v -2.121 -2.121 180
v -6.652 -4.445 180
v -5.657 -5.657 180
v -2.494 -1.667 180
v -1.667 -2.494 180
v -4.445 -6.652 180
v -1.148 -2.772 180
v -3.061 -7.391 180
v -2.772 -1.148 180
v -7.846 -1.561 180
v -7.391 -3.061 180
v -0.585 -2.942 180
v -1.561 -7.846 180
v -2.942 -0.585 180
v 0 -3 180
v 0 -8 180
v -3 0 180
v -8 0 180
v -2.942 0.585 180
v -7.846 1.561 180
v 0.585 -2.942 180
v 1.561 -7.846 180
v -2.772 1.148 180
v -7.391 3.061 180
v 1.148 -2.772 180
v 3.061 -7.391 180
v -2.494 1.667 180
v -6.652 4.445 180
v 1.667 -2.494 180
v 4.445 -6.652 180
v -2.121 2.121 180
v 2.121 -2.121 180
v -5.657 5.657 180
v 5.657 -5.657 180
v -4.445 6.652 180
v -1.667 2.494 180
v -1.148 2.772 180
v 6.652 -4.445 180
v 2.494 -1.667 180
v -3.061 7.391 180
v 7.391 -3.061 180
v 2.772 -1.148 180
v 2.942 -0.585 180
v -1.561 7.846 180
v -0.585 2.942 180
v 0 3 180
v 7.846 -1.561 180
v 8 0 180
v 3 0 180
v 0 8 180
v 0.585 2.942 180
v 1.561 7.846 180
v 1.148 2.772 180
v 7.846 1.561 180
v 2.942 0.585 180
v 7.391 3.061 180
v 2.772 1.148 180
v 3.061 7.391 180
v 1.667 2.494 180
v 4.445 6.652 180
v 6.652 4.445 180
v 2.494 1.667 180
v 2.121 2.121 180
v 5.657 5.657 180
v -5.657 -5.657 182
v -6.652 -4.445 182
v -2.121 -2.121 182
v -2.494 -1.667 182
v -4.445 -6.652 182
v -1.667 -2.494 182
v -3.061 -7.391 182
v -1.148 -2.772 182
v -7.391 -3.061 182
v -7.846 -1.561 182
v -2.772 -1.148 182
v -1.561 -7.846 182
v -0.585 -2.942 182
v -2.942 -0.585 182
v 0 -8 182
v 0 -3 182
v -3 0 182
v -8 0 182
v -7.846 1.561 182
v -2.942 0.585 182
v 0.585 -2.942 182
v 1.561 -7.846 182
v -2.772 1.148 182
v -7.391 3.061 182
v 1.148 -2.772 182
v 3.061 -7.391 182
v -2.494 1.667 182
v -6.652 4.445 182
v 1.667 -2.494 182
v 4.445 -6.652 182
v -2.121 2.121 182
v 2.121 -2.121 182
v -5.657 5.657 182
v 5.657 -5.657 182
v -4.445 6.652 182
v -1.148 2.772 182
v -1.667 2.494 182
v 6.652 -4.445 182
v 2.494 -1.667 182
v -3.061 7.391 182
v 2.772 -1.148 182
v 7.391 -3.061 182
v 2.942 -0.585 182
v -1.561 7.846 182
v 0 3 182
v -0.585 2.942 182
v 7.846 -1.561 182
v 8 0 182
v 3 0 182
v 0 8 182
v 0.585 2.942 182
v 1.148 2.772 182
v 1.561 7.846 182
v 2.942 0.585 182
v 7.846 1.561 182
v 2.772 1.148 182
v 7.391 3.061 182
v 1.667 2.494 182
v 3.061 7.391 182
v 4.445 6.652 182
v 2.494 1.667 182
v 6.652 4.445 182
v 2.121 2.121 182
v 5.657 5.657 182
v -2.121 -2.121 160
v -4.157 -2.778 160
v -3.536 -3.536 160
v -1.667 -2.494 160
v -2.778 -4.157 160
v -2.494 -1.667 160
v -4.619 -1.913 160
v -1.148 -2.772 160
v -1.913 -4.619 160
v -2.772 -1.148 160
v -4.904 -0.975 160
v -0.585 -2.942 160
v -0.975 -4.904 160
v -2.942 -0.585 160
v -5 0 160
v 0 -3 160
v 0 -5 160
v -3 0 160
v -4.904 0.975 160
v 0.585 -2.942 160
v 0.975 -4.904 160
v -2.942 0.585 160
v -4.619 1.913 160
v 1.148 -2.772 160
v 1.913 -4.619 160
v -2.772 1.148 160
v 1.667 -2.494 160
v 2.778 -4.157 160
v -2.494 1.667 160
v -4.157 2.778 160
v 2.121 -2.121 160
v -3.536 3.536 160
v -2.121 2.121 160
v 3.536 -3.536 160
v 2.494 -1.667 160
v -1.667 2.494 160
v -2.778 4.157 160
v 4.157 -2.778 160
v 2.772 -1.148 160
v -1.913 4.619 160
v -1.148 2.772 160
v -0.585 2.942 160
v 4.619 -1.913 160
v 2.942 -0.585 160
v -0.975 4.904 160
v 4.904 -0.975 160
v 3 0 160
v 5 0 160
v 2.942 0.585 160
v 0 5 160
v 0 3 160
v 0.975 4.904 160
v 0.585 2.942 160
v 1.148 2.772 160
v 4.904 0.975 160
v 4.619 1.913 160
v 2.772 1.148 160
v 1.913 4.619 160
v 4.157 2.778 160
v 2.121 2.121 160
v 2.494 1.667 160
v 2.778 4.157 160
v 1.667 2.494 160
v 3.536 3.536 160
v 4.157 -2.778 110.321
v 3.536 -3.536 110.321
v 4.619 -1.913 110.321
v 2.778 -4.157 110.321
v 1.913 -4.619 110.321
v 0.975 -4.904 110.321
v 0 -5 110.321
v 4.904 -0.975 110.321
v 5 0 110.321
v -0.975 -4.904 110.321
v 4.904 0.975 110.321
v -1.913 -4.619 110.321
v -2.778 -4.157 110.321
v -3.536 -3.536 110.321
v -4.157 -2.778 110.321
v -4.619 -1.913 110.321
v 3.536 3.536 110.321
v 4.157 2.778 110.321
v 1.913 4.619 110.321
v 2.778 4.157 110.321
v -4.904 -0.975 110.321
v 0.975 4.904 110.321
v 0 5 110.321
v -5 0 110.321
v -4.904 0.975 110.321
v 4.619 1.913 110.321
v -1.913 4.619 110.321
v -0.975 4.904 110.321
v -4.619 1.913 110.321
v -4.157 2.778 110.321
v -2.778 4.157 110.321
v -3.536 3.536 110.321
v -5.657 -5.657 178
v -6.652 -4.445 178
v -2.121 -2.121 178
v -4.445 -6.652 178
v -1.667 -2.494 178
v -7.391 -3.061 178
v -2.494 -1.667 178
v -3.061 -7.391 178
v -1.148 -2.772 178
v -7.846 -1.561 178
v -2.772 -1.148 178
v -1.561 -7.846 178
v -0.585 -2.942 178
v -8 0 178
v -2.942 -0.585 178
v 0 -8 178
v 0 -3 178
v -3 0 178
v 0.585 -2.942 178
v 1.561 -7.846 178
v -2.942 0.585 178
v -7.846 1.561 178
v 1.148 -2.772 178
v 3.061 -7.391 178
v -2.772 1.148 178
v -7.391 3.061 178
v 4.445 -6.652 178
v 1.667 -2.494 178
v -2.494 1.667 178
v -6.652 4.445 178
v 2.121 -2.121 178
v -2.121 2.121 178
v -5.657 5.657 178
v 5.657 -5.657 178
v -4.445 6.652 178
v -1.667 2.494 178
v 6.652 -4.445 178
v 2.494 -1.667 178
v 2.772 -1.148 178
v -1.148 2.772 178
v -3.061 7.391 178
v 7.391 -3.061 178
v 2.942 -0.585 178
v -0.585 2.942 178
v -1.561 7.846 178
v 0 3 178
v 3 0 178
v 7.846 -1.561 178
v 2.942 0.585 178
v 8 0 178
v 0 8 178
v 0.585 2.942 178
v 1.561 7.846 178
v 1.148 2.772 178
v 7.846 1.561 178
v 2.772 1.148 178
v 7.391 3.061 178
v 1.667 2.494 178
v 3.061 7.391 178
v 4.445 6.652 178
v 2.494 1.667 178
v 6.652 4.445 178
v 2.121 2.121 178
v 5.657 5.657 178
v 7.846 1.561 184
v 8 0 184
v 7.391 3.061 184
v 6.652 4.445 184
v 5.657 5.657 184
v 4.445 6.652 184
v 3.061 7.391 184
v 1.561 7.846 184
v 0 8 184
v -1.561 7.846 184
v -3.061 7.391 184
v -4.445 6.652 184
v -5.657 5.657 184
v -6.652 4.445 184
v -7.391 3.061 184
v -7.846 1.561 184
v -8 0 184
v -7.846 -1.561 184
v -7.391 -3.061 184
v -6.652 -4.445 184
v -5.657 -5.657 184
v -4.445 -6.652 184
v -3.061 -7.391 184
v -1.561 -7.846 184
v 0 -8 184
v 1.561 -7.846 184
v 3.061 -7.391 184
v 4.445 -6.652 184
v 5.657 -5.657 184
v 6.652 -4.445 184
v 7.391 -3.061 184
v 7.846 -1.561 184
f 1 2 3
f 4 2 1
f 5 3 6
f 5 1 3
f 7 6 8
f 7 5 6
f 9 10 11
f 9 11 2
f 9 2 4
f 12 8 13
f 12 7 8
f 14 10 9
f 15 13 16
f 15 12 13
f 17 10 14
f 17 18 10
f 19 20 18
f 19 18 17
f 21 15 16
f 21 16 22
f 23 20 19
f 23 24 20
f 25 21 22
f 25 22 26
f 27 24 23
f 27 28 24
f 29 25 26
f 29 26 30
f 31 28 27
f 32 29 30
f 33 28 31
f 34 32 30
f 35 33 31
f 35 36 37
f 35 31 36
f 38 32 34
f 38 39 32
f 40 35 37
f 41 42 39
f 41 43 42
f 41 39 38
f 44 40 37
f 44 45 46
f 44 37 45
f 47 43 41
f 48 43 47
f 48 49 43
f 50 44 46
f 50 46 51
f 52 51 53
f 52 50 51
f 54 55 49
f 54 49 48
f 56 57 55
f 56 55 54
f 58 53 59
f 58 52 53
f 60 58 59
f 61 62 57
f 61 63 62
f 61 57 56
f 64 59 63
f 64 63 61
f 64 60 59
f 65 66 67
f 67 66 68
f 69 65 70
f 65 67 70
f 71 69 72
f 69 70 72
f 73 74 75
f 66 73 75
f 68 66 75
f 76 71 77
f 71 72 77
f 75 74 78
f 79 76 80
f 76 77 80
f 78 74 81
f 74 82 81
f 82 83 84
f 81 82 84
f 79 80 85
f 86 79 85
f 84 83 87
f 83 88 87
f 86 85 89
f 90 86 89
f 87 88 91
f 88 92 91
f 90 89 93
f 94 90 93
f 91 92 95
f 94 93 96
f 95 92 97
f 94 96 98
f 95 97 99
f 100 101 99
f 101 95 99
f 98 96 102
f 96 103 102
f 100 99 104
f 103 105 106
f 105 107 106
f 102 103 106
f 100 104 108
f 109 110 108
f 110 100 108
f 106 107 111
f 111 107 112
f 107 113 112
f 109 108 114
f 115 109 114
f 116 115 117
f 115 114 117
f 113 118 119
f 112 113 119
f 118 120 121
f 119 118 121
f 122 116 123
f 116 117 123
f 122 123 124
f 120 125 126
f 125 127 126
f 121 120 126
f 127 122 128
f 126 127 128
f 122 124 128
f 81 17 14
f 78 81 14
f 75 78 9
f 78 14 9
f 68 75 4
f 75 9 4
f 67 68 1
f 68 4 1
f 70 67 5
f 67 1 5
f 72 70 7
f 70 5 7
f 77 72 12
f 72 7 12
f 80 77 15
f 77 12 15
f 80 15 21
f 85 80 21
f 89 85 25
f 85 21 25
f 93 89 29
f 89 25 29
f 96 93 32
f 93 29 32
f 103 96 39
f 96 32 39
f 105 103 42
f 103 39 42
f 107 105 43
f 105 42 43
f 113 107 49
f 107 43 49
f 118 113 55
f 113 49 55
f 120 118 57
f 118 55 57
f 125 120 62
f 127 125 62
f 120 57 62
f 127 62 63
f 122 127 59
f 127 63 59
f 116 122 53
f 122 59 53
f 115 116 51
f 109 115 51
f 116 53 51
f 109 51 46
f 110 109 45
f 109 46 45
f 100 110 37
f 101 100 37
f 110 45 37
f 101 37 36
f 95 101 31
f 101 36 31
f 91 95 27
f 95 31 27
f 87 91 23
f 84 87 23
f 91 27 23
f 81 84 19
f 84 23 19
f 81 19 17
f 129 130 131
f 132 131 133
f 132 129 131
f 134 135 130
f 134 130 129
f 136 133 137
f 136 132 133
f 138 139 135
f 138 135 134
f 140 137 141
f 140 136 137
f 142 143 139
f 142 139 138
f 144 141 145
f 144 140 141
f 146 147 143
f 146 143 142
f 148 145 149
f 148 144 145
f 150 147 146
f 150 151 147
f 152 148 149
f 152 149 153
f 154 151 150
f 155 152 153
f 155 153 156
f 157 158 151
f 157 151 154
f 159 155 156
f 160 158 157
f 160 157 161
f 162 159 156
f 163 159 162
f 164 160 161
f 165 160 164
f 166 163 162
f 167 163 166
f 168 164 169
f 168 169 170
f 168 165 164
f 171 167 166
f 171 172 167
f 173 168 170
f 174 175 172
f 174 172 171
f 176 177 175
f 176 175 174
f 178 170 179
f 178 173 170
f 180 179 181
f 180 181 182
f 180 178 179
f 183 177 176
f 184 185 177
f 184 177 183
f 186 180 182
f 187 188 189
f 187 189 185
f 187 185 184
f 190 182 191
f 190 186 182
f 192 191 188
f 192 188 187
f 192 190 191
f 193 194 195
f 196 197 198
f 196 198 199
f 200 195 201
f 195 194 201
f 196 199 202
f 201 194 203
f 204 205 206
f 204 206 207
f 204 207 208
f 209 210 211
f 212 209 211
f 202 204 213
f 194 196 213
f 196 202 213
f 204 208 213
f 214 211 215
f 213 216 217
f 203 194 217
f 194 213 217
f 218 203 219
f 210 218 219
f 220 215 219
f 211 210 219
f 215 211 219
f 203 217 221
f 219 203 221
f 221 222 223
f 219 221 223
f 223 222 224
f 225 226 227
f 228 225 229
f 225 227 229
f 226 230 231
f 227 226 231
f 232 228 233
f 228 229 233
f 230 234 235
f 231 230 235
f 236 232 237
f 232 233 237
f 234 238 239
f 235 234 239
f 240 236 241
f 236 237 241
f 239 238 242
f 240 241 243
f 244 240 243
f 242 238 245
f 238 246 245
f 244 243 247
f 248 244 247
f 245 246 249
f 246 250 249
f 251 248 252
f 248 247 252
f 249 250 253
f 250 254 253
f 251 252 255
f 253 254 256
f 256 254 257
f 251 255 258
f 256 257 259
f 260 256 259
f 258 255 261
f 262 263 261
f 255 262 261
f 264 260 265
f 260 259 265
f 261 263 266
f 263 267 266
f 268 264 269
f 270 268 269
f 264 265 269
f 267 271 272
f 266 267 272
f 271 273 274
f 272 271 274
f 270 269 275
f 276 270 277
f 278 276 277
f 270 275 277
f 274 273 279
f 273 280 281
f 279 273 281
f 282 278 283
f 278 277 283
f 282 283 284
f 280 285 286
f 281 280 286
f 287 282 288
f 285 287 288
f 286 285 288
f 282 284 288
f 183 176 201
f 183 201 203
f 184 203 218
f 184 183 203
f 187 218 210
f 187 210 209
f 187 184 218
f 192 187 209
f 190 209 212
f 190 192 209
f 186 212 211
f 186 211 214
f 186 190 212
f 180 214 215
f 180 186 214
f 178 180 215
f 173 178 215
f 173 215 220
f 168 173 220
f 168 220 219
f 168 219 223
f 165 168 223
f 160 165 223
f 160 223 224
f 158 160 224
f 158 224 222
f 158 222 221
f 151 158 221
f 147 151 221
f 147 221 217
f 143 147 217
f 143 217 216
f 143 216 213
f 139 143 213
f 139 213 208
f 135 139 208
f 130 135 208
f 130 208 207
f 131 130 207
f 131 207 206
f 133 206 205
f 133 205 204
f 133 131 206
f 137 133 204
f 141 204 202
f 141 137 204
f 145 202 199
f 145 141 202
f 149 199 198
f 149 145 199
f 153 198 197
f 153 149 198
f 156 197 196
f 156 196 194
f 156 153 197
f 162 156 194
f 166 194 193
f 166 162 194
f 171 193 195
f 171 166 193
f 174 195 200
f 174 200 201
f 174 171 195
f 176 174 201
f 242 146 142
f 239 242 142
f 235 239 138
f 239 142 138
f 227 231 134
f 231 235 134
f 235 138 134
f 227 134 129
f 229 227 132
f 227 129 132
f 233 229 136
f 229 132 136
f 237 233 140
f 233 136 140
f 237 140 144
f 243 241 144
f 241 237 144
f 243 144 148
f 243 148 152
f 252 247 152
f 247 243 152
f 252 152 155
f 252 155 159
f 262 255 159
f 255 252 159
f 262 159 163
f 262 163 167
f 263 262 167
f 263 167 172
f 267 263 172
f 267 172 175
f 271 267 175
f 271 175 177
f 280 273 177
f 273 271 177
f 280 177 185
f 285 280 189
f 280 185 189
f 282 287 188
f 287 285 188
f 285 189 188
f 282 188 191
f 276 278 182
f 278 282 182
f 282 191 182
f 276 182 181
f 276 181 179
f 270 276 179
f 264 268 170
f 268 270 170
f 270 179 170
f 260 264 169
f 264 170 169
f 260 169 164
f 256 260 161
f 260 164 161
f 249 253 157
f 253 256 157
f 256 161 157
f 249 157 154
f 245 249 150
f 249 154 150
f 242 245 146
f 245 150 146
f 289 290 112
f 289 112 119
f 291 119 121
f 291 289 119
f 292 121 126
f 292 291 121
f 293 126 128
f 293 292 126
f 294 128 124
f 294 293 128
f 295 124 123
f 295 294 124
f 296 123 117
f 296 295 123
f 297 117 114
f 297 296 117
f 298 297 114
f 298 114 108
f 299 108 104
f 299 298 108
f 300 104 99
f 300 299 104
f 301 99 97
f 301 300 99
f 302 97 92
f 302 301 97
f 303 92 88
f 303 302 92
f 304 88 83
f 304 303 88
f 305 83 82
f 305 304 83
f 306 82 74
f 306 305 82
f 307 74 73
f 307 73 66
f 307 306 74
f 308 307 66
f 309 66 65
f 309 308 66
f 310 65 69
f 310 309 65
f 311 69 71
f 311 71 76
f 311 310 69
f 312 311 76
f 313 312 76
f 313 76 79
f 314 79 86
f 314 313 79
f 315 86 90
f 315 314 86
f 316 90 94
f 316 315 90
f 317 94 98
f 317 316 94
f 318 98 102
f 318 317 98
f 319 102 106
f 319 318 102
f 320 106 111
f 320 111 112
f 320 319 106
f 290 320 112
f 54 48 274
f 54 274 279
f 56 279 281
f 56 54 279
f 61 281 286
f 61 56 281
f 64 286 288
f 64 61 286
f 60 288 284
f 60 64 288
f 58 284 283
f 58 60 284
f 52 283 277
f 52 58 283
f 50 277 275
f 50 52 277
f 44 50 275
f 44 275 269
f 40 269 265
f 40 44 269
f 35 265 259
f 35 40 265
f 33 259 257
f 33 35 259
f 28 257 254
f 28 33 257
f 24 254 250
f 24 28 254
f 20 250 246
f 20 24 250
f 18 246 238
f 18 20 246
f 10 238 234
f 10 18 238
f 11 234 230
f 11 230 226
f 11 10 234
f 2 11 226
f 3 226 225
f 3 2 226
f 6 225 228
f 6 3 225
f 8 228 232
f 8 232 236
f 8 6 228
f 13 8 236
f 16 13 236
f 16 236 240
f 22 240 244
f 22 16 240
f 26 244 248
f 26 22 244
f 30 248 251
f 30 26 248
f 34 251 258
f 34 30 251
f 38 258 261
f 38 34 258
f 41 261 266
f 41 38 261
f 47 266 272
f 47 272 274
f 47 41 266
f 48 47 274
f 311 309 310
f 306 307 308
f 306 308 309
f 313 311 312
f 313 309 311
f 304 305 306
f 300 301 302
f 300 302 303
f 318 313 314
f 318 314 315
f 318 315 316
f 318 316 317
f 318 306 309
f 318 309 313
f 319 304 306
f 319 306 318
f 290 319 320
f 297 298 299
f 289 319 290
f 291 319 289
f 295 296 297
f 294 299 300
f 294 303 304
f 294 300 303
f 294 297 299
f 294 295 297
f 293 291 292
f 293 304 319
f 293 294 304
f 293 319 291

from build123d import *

# Parameters (mm, degrees)
SKETCH_1_R               = 3
EXTRUDE_1_DEPTH          = 180
SKETCH_2_R               = 8
EXTRUDE_2_DEPTH          = 2
EXTRUDE_START            = -178
SKETCH_2_2_R             = 8
EXTRUDE_3_DEPTH          = 2
EXTRUDE_START_2          = -2
SKETCH_1_2_R             = 3
EXTRUDE_4_DEPTH          = 2
EXTRUDE_START_3          = 180
SKETCH_1_3_R             = 3
EXTRUDE_5_DEPTH          = 2
EXTRUDE_START_4          = 4
SKETCH_2_3_R             = 8
EXTRUDE_6_DEPTH          = 2
EXTRUDE_START_5          = -182
SKETCH_2_4_R             = 8
EXTRUDE_7_DEPTH          = 2
EXTRUDE_START_6          = -64
SKETCH_3_R               = 5
EXTRUDE_10_DEPTH         = 60
CUT_EXTRUDE_1_DEPTH      = 185.347497949
CUT_EXTRUDE_1_DEPTH_BACK = 185.347497949
SKETCH_4_W               = 129.449632944
SKETCH_4_H               = 45.19740272
EXTRUDE_START_7          = 20
SKETCH_5_R               = 5
EXTRUDE_11_DEPTH         = 20
EXTRUDE_START_8          = 40
SKETCH_5_2_R             = 5
EXTRUDE_12_DEPTH         = 40


with BuildPart() as part:
    # 草图1 → 凸台-拉伸1 (new body)
    with BuildSketch(Plane.XY):
        with Locations(Location((0, 0, 0), (0, 0, 180))):
            Circle(SKETCH_1_R)
    extrude(amount=EXTRUDE_1_DEPTH)

    # 草图2 → 凸台-拉伸2 (add)
    with BuildSketch(Plane.XY.offset(180)):
        Circle(SKETCH_2_R)
    extrude(amount=-EXTRUDE_2_DEPTH)

    # 草图2<2> → 凸台-拉伸3 (add)
    with BuildSketch(Plane.XY.offset(180).offset(EXTRUDE_START)):
        Circle(SKETCH_2_2_R)
    extrude(amount=-EXTRUDE_3_DEPTH)

    # 草图1<2> → 凸台-拉伸4 (add)
    with BuildSketch(Plane.XY.offset(EXTRUDE_START_2)):
        with Locations(Location((0, 0, 0), (0, 0, 180))):
            Circle(SKETCH_1_2_R)
    extrude(amount=EXTRUDE_4_DEPTH)

    # 草图1<3> → 凸台-拉伸5 (add)
    with BuildSketch(Plane.XY.offset(EXTRUDE_START_3)):
        with Locations(Location((0, 0, 0), (0, 0, 180))):
            Circle(SKETCH_1_3_R)
    extrude(amount=EXTRUDE_5_DEPTH)

    # 草图2<3> → 凸台-拉伸6 (add)
    with BuildSketch(Plane.XY.offset(180).offset(EXTRUDE_START_4)):
        Circle(SKETCH_2_3_R)
    extrude(amount=-EXTRUDE_6_DEPTH)

    # 草图2<4> → 凸台-拉伸7 (add)
    with BuildSketch(Plane.XY.offset(180).offset(EXTRUDE_START_5)):
        Circle(SKETCH_2_4_R)
    extrude(amount=-EXTRUDE_7_DEPTH)

    # 草图3 → 凸台-拉伸10 (add)
    with BuildSketch(Plane.XY.offset(184).offset(EXTRUDE_START_6)):
        Circle(SKETCH_3_R)
    extrude(amount=-EXTRUDE_10_DEPTH)

    # 草图4 → 切除-拉伸1 (cut, two sides: drawn at the far end of the back side and taken through both)
    with BuildSketch(Plane(origin=(0, 0, 0), x_dir=(0, 0, -1), z_dir=(1, 0, 0)).offset(-CUT_EXTRUDE_1_DEPTH_BACK)):
        with Locations((-45.596015123, 0.262013929)):
            Rectangle(SKETCH_4_W, SKETCH_4_H)
    extrude(amount=CUT_EXTRUDE_1_DEPTH + CUT_EXTRUDE_1_DEPTH_BACK, mode=Mode.SUBTRACT)

    # 草图5 → 凸台-拉伸11 (add)
    with BuildSketch(Plane.XY.offset(120).offset(EXTRUDE_START_7)):
        Circle(SKETCH_5_R)
    extrude(amount=-EXTRUDE_11_DEPTH)

    # 草图5<2> → 凸台-拉伸12 (add)
    with BuildSketch(Plane.XY.offset(120).offset(EXTRUDE_START_8)):
        Circle(SKETCH_5_2_R)
    extrude(amount=-EXTRUDE_12_DEPTH)


solid = part.part
